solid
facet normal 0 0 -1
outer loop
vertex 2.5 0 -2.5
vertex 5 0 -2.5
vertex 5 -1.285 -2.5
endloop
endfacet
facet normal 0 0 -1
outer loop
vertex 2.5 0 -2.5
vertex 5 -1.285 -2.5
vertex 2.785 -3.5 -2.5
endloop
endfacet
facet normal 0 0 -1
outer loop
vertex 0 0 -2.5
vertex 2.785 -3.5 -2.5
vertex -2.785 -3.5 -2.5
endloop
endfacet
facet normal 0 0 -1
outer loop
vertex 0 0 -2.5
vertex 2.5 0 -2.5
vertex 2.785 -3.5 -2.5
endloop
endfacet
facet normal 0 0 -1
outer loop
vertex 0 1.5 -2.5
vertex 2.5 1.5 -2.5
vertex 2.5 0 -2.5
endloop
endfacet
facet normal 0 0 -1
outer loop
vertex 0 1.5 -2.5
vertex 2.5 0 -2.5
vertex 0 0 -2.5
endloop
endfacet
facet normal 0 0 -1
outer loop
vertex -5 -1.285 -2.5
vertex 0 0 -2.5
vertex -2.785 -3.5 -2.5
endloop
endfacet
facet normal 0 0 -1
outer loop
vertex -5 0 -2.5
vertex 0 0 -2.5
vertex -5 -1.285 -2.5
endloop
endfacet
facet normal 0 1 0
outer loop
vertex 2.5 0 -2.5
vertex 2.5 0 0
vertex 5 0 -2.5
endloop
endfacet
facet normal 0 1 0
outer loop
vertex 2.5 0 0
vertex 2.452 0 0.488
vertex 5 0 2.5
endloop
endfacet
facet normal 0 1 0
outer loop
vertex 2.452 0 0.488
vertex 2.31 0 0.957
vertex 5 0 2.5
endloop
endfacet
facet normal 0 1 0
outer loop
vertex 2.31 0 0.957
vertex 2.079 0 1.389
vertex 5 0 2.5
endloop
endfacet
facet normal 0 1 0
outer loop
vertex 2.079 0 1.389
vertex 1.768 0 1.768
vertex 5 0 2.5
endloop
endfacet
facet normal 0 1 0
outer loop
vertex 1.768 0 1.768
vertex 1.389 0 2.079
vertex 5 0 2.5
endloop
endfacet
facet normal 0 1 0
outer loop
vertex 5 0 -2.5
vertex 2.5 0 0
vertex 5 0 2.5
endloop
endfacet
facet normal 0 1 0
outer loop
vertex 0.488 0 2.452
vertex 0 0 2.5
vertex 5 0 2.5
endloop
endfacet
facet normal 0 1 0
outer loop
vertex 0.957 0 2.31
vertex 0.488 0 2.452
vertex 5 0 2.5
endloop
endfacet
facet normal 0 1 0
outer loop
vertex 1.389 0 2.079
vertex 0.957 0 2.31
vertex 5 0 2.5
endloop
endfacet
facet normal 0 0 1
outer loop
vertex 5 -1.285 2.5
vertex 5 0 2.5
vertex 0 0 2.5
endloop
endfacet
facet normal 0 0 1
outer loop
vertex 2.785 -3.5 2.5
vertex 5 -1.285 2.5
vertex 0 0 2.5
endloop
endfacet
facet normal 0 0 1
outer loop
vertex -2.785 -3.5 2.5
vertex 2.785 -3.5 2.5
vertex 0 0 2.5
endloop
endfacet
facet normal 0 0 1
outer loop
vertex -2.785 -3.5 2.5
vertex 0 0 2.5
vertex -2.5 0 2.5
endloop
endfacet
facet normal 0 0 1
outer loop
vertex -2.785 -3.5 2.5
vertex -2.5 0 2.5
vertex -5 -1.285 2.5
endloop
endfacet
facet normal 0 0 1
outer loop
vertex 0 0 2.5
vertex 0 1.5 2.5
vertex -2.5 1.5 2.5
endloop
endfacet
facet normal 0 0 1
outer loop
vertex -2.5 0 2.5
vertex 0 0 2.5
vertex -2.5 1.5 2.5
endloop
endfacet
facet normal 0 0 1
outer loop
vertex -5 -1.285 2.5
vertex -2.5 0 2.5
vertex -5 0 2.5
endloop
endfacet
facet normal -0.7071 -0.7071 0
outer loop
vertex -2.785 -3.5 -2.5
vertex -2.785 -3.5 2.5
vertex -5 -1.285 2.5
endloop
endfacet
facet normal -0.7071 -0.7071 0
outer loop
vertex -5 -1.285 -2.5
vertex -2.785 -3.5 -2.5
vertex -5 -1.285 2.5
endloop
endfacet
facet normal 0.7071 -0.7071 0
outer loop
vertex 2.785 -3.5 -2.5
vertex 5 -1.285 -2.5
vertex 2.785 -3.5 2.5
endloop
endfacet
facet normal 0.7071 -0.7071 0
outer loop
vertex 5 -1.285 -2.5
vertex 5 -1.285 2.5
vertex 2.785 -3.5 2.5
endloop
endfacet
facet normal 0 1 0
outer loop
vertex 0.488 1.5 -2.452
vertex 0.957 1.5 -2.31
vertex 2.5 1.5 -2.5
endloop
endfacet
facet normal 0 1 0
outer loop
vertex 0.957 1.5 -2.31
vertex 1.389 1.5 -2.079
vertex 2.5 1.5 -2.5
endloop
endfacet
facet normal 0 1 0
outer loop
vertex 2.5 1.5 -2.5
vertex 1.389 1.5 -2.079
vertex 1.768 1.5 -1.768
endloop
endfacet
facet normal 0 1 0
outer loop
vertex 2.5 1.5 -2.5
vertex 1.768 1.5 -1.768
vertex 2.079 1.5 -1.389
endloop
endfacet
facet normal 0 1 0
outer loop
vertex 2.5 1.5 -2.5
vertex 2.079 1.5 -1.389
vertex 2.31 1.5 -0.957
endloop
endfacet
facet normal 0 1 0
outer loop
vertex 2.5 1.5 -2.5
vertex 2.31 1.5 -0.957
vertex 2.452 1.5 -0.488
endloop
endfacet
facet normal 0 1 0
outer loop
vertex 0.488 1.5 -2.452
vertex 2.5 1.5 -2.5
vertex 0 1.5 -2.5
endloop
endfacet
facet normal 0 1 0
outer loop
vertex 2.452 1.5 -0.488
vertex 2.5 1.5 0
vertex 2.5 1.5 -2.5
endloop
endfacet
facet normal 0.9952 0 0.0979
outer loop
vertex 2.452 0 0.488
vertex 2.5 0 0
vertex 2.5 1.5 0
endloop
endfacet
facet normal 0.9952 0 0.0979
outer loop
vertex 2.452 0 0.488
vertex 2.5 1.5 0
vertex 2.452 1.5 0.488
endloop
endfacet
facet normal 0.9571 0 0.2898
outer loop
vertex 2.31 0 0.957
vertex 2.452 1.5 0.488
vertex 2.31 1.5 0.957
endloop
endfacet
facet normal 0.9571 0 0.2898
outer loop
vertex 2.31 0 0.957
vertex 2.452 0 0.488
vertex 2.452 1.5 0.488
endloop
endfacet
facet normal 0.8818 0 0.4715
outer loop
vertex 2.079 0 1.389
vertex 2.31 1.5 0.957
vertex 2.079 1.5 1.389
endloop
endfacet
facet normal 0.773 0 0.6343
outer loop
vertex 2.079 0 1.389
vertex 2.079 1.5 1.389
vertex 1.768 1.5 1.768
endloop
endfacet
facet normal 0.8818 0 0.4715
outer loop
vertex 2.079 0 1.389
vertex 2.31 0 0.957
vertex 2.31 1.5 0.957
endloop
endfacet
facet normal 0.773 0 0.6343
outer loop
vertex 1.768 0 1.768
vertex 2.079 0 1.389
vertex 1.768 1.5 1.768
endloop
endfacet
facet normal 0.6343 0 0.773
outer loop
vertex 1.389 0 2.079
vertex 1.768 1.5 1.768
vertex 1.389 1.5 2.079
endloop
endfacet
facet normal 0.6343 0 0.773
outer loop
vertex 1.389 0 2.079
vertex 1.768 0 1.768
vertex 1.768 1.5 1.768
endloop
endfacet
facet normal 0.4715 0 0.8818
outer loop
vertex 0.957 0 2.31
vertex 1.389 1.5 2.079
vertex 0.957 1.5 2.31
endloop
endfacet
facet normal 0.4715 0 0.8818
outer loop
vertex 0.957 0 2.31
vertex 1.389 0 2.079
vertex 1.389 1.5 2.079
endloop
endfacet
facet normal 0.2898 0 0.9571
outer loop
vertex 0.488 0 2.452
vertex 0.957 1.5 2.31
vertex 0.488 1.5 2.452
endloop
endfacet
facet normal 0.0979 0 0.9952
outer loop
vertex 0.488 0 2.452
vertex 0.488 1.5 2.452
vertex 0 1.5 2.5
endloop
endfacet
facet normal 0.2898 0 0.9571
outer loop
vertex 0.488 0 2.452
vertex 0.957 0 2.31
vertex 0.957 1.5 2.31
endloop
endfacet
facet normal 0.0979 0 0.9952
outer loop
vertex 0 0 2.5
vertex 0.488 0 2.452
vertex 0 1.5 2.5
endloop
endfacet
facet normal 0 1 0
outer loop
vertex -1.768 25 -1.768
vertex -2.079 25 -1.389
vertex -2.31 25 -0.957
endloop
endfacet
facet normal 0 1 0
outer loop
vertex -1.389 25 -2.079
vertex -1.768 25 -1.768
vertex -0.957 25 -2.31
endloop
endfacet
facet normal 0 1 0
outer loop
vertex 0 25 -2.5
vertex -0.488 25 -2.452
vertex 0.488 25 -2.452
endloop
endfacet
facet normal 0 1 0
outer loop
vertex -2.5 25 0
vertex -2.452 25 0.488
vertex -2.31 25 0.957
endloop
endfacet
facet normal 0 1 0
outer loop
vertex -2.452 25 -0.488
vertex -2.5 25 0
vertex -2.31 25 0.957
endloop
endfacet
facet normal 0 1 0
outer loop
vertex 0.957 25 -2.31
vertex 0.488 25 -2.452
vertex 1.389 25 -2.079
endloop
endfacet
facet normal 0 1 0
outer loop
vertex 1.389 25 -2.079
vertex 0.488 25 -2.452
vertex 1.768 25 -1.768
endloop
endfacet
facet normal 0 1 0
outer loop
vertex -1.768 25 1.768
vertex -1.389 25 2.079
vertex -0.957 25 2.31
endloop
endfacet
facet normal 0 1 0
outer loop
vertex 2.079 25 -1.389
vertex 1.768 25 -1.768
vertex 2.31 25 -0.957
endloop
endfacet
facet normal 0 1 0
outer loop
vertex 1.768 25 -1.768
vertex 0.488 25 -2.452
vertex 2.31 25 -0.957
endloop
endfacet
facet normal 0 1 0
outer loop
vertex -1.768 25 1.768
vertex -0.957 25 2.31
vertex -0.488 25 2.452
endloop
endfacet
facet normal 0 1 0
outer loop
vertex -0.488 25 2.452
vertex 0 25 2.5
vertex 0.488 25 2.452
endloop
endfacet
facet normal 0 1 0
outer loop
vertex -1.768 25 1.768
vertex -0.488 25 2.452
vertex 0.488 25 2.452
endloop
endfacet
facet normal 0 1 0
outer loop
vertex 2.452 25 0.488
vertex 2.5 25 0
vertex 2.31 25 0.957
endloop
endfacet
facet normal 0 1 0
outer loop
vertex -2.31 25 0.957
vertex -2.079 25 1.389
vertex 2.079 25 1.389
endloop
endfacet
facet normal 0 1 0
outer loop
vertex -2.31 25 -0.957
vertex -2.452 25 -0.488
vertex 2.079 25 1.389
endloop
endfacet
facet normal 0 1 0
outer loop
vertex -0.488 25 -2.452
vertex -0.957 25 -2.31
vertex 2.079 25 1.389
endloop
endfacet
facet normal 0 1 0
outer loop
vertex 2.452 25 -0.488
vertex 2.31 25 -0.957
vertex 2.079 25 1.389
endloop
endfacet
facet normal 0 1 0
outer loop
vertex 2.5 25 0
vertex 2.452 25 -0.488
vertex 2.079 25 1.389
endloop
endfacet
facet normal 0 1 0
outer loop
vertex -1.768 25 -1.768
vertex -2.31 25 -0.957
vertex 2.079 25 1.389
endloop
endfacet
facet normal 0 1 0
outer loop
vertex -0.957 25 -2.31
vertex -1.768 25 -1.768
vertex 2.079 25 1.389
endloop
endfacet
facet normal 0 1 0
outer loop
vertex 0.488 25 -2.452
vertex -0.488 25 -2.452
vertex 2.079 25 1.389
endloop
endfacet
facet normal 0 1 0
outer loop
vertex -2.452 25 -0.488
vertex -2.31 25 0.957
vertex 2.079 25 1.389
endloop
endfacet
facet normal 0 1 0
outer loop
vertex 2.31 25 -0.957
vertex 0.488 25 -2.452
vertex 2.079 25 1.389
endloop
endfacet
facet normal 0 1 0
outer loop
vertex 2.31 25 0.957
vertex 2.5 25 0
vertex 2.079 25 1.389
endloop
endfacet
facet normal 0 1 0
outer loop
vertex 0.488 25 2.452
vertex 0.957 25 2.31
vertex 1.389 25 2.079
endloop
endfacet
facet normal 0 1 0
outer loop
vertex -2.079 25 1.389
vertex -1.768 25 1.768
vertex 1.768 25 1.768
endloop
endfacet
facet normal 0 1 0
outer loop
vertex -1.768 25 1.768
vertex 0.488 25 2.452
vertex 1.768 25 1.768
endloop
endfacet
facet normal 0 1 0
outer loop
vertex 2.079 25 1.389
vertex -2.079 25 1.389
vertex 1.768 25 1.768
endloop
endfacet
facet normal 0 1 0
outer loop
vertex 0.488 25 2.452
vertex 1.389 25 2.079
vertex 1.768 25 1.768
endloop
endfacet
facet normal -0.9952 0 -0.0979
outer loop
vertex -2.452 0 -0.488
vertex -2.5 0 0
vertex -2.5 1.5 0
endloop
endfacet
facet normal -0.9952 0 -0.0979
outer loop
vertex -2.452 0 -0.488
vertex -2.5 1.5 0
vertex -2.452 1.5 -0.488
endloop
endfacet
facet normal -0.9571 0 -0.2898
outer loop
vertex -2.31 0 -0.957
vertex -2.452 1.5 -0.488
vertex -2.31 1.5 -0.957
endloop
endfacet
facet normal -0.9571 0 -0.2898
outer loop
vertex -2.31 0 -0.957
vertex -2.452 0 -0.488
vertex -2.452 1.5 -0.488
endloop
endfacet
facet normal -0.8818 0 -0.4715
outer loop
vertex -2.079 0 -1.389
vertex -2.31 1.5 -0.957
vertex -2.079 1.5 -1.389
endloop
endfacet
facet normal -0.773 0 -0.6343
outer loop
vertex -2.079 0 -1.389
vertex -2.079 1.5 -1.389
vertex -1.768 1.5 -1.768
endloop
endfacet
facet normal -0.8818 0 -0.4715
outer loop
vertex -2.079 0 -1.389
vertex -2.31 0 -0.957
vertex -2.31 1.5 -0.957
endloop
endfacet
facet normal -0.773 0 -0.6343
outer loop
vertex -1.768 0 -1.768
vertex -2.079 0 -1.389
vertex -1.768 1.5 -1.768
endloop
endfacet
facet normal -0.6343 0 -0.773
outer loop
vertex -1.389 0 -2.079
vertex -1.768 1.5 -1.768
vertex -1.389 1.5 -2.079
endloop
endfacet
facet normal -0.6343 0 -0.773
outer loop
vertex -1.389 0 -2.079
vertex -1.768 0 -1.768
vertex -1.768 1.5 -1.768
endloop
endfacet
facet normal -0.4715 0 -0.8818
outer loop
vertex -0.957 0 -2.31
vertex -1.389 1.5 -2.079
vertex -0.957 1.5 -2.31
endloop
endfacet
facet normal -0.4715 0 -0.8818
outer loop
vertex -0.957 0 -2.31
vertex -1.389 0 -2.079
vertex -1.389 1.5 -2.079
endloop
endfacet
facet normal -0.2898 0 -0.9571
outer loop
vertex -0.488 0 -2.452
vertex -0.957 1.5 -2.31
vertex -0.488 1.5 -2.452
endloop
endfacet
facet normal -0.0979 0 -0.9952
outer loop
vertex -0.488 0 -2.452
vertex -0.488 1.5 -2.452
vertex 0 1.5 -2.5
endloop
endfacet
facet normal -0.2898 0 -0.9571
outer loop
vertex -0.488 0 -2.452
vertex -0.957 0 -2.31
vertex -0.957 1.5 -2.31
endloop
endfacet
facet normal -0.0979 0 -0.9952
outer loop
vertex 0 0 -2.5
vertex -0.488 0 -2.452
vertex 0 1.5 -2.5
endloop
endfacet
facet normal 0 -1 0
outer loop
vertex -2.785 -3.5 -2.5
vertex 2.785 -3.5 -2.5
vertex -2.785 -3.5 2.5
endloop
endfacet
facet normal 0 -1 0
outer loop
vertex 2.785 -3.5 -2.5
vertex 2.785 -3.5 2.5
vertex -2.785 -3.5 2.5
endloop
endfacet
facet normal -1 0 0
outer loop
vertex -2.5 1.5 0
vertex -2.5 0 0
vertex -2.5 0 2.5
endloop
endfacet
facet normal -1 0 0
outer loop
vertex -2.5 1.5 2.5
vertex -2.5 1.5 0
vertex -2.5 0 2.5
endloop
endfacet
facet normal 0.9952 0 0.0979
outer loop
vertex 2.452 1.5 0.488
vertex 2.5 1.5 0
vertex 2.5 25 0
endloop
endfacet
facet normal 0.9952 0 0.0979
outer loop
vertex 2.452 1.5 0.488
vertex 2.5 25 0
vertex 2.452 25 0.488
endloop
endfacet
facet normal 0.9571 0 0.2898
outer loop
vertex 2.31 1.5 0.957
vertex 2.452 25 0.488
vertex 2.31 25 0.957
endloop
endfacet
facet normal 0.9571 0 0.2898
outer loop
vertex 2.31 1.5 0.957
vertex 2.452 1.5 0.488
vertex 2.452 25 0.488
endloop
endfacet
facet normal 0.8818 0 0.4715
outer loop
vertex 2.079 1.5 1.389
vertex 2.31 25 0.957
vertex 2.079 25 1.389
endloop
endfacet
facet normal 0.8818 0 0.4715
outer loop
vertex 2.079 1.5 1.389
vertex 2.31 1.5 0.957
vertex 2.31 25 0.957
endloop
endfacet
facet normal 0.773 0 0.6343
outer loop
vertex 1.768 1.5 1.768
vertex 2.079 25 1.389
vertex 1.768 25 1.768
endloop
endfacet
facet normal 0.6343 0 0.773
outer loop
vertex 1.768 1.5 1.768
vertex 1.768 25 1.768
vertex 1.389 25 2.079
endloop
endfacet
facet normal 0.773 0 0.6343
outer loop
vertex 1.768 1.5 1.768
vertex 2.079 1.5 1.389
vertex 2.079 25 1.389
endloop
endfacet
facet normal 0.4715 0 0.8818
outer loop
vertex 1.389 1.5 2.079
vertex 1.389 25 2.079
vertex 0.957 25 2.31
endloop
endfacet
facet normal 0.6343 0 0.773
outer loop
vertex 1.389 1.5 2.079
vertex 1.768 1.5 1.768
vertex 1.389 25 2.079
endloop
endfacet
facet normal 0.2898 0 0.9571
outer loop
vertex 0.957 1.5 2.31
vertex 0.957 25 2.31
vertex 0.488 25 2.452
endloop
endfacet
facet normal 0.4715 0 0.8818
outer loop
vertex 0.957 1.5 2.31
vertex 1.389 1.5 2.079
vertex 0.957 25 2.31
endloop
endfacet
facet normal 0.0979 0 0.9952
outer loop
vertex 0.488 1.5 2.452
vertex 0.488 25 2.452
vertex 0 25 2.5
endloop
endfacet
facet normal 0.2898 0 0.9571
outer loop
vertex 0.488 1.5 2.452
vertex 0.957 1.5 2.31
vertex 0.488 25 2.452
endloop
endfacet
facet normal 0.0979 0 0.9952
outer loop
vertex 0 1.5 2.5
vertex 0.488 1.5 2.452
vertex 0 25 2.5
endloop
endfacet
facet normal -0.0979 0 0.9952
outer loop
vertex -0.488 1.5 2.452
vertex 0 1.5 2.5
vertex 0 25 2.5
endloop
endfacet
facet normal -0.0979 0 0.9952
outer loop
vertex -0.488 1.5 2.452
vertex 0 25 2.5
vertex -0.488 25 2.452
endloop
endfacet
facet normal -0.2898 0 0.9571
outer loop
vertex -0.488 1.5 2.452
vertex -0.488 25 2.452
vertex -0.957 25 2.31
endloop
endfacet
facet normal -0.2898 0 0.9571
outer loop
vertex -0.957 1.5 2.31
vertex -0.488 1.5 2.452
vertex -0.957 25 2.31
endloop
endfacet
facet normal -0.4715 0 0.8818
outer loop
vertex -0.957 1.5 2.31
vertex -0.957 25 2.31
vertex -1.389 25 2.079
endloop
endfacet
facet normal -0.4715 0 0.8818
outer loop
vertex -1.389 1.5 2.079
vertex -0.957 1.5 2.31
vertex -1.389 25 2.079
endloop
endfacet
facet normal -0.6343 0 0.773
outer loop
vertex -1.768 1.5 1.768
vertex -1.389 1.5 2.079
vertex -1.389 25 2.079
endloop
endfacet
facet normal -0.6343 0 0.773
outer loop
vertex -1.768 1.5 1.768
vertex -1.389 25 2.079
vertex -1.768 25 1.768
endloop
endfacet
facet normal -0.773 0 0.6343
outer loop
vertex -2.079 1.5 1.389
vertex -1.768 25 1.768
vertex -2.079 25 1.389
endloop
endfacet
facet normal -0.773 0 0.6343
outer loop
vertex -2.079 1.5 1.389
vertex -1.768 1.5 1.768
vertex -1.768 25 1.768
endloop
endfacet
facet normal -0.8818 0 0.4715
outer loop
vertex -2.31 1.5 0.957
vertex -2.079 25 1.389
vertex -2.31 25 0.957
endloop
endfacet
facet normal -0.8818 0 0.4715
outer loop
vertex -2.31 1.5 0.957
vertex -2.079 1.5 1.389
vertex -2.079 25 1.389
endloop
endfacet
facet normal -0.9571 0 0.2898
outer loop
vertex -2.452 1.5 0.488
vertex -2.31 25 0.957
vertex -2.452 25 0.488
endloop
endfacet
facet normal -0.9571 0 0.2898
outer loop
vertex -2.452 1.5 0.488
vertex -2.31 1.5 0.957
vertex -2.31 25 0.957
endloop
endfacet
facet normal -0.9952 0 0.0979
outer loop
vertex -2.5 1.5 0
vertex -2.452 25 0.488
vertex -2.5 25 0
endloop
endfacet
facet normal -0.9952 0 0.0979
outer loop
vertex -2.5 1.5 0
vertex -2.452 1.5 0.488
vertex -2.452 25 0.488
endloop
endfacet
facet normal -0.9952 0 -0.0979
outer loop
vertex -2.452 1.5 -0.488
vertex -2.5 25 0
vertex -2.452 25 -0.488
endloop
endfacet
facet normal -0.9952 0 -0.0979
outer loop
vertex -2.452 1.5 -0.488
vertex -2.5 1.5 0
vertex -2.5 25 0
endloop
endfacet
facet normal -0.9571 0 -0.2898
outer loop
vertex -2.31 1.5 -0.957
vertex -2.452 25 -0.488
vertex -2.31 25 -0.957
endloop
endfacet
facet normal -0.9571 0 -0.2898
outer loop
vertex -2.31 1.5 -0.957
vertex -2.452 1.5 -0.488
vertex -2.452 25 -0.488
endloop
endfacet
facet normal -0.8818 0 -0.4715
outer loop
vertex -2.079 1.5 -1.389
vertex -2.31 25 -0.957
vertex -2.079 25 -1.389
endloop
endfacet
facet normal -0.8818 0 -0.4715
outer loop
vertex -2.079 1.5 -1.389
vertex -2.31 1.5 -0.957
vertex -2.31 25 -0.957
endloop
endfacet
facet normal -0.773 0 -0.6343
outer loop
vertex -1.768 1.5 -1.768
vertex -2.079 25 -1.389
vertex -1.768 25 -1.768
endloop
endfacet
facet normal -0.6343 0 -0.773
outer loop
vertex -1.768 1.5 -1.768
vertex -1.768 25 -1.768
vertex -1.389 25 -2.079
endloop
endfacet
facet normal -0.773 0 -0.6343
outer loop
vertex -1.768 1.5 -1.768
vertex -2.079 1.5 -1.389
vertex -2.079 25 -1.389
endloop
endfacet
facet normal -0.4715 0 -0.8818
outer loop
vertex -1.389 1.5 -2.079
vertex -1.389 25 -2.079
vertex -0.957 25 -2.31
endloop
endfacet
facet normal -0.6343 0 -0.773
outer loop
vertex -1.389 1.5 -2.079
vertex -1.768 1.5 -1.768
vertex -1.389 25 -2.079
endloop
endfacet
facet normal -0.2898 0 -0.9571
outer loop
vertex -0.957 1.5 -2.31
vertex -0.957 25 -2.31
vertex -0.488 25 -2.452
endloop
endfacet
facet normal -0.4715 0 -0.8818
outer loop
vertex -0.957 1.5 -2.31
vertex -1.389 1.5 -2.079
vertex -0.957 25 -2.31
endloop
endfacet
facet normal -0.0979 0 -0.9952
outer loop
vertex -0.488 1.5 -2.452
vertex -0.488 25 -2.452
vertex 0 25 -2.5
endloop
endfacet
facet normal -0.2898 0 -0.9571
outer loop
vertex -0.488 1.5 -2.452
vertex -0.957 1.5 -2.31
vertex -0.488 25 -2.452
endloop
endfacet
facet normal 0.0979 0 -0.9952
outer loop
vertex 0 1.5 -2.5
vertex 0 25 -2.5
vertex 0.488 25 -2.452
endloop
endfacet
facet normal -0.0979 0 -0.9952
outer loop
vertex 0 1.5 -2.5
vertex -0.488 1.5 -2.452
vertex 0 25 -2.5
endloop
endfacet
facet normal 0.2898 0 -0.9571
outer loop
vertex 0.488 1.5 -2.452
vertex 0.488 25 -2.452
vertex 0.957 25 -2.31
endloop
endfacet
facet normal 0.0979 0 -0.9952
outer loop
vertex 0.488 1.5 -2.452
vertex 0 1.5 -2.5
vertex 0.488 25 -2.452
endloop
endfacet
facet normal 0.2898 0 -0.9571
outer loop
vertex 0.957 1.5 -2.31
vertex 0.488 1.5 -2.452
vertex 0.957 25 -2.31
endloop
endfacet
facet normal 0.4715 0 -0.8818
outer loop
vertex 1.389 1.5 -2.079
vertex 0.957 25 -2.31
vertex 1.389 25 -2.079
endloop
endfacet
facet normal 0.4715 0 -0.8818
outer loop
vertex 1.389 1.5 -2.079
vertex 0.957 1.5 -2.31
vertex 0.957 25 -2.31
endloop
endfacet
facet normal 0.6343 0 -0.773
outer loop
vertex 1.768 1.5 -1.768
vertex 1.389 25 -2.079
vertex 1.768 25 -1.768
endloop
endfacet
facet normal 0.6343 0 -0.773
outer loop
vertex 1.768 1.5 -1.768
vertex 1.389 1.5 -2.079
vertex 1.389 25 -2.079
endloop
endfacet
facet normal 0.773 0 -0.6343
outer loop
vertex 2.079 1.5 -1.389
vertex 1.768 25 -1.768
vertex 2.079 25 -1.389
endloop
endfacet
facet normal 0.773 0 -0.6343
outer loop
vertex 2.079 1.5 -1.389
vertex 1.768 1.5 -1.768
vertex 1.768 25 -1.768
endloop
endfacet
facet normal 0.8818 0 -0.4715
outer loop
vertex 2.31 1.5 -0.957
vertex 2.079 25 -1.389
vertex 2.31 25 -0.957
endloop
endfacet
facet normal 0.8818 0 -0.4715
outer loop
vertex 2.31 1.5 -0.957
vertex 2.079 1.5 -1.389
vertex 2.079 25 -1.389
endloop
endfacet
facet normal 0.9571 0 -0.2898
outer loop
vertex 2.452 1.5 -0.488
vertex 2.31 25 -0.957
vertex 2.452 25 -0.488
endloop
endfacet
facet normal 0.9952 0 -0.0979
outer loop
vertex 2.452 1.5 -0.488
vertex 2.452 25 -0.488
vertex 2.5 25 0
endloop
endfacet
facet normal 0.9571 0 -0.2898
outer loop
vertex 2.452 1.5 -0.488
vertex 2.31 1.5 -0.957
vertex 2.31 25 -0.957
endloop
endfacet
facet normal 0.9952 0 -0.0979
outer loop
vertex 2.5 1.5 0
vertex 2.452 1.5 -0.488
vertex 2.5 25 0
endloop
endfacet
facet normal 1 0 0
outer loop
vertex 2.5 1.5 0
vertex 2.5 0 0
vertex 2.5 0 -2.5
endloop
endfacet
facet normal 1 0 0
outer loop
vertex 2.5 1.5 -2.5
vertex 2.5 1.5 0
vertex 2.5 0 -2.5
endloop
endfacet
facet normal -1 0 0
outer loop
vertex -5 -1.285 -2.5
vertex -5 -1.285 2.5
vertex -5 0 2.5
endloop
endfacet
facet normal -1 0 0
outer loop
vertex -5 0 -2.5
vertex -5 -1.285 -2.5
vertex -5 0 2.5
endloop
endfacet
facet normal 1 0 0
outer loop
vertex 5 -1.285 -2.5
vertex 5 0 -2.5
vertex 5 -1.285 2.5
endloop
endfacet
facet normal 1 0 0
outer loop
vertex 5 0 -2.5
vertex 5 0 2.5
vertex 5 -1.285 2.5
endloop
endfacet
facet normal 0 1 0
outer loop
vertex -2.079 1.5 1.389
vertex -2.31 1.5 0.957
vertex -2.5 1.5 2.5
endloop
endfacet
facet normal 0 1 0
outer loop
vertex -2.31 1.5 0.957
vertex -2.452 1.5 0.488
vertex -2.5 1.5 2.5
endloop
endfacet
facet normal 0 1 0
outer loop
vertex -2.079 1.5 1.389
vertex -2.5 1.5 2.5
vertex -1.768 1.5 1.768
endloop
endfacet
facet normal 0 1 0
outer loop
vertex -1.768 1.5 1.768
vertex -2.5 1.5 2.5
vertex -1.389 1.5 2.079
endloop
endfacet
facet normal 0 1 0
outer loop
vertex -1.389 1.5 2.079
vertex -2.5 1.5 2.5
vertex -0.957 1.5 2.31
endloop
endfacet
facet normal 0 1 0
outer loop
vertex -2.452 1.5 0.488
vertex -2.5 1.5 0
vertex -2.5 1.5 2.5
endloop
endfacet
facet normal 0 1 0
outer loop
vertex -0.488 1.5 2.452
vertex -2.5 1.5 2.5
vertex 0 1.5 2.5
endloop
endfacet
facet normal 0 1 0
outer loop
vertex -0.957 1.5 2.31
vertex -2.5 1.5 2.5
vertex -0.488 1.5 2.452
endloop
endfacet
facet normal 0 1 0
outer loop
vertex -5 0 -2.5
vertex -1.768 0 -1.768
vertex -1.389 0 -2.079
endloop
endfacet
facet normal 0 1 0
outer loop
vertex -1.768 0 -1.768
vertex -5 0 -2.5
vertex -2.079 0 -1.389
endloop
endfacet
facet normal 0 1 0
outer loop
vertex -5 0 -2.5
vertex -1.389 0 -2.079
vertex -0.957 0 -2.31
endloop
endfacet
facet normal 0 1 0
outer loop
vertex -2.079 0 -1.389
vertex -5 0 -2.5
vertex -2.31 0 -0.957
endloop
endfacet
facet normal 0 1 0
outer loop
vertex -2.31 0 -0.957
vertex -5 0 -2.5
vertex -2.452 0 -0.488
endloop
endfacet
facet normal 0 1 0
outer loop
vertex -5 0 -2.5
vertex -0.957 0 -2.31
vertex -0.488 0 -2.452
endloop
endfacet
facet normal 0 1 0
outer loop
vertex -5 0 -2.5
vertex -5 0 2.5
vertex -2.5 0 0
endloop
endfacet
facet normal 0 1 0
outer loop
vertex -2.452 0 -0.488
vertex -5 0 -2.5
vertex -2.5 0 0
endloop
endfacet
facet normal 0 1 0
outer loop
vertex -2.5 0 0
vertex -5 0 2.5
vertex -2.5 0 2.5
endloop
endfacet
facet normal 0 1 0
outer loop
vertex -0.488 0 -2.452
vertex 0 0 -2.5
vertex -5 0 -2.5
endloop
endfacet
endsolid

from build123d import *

# Parameters (mm, degrees)
PAD_DEPTH    = 2.5
PAD001_DEPTH = 1.5
SKETCH002_R  = 2.5
PAD002_DEPTH = 25


with BuildPart() as part:
    # Sketch → Pad (new body, symmetric)
    with BuildSketch(Plane.XY):
        Polygon((-5, 0), (5, 0), (5, -1.284989), (2.784989, -3.5), (-2.784989, -3.5), (-5, -1.284989), align=None)
    extrude(amount=PAD_DEPTH, both=True)

    # Sketch001 → Pad001 (join)
    with BuildSketch(Plane.XZ):
        with BuildLine():
            ThreePointArc((-2.5, 0), (-1.767767, -1.767767), (0, -2.5))
            Line((0, -2.5), (2.5, -2.5))
            Line((2.5, 0), (2.5, -2.5))
            ThreePointArc((2.5, 0), (1.767767, 1.767767), (0, 2.5))
            Line((-2.5, 2.5), (0, 2.5))
            Line((-2.5, 0), (-2.5, 2.5))
        make_face()
    extrude(amount=-PAD001_DEPTH)

    # Sketch002 → Pad002 (join)
    with BuildSketch(Plane.XZ):
        Circle(SKETCH002_R)
    extrude(amount=-PAD002_DEPTH)


solid = part.part
